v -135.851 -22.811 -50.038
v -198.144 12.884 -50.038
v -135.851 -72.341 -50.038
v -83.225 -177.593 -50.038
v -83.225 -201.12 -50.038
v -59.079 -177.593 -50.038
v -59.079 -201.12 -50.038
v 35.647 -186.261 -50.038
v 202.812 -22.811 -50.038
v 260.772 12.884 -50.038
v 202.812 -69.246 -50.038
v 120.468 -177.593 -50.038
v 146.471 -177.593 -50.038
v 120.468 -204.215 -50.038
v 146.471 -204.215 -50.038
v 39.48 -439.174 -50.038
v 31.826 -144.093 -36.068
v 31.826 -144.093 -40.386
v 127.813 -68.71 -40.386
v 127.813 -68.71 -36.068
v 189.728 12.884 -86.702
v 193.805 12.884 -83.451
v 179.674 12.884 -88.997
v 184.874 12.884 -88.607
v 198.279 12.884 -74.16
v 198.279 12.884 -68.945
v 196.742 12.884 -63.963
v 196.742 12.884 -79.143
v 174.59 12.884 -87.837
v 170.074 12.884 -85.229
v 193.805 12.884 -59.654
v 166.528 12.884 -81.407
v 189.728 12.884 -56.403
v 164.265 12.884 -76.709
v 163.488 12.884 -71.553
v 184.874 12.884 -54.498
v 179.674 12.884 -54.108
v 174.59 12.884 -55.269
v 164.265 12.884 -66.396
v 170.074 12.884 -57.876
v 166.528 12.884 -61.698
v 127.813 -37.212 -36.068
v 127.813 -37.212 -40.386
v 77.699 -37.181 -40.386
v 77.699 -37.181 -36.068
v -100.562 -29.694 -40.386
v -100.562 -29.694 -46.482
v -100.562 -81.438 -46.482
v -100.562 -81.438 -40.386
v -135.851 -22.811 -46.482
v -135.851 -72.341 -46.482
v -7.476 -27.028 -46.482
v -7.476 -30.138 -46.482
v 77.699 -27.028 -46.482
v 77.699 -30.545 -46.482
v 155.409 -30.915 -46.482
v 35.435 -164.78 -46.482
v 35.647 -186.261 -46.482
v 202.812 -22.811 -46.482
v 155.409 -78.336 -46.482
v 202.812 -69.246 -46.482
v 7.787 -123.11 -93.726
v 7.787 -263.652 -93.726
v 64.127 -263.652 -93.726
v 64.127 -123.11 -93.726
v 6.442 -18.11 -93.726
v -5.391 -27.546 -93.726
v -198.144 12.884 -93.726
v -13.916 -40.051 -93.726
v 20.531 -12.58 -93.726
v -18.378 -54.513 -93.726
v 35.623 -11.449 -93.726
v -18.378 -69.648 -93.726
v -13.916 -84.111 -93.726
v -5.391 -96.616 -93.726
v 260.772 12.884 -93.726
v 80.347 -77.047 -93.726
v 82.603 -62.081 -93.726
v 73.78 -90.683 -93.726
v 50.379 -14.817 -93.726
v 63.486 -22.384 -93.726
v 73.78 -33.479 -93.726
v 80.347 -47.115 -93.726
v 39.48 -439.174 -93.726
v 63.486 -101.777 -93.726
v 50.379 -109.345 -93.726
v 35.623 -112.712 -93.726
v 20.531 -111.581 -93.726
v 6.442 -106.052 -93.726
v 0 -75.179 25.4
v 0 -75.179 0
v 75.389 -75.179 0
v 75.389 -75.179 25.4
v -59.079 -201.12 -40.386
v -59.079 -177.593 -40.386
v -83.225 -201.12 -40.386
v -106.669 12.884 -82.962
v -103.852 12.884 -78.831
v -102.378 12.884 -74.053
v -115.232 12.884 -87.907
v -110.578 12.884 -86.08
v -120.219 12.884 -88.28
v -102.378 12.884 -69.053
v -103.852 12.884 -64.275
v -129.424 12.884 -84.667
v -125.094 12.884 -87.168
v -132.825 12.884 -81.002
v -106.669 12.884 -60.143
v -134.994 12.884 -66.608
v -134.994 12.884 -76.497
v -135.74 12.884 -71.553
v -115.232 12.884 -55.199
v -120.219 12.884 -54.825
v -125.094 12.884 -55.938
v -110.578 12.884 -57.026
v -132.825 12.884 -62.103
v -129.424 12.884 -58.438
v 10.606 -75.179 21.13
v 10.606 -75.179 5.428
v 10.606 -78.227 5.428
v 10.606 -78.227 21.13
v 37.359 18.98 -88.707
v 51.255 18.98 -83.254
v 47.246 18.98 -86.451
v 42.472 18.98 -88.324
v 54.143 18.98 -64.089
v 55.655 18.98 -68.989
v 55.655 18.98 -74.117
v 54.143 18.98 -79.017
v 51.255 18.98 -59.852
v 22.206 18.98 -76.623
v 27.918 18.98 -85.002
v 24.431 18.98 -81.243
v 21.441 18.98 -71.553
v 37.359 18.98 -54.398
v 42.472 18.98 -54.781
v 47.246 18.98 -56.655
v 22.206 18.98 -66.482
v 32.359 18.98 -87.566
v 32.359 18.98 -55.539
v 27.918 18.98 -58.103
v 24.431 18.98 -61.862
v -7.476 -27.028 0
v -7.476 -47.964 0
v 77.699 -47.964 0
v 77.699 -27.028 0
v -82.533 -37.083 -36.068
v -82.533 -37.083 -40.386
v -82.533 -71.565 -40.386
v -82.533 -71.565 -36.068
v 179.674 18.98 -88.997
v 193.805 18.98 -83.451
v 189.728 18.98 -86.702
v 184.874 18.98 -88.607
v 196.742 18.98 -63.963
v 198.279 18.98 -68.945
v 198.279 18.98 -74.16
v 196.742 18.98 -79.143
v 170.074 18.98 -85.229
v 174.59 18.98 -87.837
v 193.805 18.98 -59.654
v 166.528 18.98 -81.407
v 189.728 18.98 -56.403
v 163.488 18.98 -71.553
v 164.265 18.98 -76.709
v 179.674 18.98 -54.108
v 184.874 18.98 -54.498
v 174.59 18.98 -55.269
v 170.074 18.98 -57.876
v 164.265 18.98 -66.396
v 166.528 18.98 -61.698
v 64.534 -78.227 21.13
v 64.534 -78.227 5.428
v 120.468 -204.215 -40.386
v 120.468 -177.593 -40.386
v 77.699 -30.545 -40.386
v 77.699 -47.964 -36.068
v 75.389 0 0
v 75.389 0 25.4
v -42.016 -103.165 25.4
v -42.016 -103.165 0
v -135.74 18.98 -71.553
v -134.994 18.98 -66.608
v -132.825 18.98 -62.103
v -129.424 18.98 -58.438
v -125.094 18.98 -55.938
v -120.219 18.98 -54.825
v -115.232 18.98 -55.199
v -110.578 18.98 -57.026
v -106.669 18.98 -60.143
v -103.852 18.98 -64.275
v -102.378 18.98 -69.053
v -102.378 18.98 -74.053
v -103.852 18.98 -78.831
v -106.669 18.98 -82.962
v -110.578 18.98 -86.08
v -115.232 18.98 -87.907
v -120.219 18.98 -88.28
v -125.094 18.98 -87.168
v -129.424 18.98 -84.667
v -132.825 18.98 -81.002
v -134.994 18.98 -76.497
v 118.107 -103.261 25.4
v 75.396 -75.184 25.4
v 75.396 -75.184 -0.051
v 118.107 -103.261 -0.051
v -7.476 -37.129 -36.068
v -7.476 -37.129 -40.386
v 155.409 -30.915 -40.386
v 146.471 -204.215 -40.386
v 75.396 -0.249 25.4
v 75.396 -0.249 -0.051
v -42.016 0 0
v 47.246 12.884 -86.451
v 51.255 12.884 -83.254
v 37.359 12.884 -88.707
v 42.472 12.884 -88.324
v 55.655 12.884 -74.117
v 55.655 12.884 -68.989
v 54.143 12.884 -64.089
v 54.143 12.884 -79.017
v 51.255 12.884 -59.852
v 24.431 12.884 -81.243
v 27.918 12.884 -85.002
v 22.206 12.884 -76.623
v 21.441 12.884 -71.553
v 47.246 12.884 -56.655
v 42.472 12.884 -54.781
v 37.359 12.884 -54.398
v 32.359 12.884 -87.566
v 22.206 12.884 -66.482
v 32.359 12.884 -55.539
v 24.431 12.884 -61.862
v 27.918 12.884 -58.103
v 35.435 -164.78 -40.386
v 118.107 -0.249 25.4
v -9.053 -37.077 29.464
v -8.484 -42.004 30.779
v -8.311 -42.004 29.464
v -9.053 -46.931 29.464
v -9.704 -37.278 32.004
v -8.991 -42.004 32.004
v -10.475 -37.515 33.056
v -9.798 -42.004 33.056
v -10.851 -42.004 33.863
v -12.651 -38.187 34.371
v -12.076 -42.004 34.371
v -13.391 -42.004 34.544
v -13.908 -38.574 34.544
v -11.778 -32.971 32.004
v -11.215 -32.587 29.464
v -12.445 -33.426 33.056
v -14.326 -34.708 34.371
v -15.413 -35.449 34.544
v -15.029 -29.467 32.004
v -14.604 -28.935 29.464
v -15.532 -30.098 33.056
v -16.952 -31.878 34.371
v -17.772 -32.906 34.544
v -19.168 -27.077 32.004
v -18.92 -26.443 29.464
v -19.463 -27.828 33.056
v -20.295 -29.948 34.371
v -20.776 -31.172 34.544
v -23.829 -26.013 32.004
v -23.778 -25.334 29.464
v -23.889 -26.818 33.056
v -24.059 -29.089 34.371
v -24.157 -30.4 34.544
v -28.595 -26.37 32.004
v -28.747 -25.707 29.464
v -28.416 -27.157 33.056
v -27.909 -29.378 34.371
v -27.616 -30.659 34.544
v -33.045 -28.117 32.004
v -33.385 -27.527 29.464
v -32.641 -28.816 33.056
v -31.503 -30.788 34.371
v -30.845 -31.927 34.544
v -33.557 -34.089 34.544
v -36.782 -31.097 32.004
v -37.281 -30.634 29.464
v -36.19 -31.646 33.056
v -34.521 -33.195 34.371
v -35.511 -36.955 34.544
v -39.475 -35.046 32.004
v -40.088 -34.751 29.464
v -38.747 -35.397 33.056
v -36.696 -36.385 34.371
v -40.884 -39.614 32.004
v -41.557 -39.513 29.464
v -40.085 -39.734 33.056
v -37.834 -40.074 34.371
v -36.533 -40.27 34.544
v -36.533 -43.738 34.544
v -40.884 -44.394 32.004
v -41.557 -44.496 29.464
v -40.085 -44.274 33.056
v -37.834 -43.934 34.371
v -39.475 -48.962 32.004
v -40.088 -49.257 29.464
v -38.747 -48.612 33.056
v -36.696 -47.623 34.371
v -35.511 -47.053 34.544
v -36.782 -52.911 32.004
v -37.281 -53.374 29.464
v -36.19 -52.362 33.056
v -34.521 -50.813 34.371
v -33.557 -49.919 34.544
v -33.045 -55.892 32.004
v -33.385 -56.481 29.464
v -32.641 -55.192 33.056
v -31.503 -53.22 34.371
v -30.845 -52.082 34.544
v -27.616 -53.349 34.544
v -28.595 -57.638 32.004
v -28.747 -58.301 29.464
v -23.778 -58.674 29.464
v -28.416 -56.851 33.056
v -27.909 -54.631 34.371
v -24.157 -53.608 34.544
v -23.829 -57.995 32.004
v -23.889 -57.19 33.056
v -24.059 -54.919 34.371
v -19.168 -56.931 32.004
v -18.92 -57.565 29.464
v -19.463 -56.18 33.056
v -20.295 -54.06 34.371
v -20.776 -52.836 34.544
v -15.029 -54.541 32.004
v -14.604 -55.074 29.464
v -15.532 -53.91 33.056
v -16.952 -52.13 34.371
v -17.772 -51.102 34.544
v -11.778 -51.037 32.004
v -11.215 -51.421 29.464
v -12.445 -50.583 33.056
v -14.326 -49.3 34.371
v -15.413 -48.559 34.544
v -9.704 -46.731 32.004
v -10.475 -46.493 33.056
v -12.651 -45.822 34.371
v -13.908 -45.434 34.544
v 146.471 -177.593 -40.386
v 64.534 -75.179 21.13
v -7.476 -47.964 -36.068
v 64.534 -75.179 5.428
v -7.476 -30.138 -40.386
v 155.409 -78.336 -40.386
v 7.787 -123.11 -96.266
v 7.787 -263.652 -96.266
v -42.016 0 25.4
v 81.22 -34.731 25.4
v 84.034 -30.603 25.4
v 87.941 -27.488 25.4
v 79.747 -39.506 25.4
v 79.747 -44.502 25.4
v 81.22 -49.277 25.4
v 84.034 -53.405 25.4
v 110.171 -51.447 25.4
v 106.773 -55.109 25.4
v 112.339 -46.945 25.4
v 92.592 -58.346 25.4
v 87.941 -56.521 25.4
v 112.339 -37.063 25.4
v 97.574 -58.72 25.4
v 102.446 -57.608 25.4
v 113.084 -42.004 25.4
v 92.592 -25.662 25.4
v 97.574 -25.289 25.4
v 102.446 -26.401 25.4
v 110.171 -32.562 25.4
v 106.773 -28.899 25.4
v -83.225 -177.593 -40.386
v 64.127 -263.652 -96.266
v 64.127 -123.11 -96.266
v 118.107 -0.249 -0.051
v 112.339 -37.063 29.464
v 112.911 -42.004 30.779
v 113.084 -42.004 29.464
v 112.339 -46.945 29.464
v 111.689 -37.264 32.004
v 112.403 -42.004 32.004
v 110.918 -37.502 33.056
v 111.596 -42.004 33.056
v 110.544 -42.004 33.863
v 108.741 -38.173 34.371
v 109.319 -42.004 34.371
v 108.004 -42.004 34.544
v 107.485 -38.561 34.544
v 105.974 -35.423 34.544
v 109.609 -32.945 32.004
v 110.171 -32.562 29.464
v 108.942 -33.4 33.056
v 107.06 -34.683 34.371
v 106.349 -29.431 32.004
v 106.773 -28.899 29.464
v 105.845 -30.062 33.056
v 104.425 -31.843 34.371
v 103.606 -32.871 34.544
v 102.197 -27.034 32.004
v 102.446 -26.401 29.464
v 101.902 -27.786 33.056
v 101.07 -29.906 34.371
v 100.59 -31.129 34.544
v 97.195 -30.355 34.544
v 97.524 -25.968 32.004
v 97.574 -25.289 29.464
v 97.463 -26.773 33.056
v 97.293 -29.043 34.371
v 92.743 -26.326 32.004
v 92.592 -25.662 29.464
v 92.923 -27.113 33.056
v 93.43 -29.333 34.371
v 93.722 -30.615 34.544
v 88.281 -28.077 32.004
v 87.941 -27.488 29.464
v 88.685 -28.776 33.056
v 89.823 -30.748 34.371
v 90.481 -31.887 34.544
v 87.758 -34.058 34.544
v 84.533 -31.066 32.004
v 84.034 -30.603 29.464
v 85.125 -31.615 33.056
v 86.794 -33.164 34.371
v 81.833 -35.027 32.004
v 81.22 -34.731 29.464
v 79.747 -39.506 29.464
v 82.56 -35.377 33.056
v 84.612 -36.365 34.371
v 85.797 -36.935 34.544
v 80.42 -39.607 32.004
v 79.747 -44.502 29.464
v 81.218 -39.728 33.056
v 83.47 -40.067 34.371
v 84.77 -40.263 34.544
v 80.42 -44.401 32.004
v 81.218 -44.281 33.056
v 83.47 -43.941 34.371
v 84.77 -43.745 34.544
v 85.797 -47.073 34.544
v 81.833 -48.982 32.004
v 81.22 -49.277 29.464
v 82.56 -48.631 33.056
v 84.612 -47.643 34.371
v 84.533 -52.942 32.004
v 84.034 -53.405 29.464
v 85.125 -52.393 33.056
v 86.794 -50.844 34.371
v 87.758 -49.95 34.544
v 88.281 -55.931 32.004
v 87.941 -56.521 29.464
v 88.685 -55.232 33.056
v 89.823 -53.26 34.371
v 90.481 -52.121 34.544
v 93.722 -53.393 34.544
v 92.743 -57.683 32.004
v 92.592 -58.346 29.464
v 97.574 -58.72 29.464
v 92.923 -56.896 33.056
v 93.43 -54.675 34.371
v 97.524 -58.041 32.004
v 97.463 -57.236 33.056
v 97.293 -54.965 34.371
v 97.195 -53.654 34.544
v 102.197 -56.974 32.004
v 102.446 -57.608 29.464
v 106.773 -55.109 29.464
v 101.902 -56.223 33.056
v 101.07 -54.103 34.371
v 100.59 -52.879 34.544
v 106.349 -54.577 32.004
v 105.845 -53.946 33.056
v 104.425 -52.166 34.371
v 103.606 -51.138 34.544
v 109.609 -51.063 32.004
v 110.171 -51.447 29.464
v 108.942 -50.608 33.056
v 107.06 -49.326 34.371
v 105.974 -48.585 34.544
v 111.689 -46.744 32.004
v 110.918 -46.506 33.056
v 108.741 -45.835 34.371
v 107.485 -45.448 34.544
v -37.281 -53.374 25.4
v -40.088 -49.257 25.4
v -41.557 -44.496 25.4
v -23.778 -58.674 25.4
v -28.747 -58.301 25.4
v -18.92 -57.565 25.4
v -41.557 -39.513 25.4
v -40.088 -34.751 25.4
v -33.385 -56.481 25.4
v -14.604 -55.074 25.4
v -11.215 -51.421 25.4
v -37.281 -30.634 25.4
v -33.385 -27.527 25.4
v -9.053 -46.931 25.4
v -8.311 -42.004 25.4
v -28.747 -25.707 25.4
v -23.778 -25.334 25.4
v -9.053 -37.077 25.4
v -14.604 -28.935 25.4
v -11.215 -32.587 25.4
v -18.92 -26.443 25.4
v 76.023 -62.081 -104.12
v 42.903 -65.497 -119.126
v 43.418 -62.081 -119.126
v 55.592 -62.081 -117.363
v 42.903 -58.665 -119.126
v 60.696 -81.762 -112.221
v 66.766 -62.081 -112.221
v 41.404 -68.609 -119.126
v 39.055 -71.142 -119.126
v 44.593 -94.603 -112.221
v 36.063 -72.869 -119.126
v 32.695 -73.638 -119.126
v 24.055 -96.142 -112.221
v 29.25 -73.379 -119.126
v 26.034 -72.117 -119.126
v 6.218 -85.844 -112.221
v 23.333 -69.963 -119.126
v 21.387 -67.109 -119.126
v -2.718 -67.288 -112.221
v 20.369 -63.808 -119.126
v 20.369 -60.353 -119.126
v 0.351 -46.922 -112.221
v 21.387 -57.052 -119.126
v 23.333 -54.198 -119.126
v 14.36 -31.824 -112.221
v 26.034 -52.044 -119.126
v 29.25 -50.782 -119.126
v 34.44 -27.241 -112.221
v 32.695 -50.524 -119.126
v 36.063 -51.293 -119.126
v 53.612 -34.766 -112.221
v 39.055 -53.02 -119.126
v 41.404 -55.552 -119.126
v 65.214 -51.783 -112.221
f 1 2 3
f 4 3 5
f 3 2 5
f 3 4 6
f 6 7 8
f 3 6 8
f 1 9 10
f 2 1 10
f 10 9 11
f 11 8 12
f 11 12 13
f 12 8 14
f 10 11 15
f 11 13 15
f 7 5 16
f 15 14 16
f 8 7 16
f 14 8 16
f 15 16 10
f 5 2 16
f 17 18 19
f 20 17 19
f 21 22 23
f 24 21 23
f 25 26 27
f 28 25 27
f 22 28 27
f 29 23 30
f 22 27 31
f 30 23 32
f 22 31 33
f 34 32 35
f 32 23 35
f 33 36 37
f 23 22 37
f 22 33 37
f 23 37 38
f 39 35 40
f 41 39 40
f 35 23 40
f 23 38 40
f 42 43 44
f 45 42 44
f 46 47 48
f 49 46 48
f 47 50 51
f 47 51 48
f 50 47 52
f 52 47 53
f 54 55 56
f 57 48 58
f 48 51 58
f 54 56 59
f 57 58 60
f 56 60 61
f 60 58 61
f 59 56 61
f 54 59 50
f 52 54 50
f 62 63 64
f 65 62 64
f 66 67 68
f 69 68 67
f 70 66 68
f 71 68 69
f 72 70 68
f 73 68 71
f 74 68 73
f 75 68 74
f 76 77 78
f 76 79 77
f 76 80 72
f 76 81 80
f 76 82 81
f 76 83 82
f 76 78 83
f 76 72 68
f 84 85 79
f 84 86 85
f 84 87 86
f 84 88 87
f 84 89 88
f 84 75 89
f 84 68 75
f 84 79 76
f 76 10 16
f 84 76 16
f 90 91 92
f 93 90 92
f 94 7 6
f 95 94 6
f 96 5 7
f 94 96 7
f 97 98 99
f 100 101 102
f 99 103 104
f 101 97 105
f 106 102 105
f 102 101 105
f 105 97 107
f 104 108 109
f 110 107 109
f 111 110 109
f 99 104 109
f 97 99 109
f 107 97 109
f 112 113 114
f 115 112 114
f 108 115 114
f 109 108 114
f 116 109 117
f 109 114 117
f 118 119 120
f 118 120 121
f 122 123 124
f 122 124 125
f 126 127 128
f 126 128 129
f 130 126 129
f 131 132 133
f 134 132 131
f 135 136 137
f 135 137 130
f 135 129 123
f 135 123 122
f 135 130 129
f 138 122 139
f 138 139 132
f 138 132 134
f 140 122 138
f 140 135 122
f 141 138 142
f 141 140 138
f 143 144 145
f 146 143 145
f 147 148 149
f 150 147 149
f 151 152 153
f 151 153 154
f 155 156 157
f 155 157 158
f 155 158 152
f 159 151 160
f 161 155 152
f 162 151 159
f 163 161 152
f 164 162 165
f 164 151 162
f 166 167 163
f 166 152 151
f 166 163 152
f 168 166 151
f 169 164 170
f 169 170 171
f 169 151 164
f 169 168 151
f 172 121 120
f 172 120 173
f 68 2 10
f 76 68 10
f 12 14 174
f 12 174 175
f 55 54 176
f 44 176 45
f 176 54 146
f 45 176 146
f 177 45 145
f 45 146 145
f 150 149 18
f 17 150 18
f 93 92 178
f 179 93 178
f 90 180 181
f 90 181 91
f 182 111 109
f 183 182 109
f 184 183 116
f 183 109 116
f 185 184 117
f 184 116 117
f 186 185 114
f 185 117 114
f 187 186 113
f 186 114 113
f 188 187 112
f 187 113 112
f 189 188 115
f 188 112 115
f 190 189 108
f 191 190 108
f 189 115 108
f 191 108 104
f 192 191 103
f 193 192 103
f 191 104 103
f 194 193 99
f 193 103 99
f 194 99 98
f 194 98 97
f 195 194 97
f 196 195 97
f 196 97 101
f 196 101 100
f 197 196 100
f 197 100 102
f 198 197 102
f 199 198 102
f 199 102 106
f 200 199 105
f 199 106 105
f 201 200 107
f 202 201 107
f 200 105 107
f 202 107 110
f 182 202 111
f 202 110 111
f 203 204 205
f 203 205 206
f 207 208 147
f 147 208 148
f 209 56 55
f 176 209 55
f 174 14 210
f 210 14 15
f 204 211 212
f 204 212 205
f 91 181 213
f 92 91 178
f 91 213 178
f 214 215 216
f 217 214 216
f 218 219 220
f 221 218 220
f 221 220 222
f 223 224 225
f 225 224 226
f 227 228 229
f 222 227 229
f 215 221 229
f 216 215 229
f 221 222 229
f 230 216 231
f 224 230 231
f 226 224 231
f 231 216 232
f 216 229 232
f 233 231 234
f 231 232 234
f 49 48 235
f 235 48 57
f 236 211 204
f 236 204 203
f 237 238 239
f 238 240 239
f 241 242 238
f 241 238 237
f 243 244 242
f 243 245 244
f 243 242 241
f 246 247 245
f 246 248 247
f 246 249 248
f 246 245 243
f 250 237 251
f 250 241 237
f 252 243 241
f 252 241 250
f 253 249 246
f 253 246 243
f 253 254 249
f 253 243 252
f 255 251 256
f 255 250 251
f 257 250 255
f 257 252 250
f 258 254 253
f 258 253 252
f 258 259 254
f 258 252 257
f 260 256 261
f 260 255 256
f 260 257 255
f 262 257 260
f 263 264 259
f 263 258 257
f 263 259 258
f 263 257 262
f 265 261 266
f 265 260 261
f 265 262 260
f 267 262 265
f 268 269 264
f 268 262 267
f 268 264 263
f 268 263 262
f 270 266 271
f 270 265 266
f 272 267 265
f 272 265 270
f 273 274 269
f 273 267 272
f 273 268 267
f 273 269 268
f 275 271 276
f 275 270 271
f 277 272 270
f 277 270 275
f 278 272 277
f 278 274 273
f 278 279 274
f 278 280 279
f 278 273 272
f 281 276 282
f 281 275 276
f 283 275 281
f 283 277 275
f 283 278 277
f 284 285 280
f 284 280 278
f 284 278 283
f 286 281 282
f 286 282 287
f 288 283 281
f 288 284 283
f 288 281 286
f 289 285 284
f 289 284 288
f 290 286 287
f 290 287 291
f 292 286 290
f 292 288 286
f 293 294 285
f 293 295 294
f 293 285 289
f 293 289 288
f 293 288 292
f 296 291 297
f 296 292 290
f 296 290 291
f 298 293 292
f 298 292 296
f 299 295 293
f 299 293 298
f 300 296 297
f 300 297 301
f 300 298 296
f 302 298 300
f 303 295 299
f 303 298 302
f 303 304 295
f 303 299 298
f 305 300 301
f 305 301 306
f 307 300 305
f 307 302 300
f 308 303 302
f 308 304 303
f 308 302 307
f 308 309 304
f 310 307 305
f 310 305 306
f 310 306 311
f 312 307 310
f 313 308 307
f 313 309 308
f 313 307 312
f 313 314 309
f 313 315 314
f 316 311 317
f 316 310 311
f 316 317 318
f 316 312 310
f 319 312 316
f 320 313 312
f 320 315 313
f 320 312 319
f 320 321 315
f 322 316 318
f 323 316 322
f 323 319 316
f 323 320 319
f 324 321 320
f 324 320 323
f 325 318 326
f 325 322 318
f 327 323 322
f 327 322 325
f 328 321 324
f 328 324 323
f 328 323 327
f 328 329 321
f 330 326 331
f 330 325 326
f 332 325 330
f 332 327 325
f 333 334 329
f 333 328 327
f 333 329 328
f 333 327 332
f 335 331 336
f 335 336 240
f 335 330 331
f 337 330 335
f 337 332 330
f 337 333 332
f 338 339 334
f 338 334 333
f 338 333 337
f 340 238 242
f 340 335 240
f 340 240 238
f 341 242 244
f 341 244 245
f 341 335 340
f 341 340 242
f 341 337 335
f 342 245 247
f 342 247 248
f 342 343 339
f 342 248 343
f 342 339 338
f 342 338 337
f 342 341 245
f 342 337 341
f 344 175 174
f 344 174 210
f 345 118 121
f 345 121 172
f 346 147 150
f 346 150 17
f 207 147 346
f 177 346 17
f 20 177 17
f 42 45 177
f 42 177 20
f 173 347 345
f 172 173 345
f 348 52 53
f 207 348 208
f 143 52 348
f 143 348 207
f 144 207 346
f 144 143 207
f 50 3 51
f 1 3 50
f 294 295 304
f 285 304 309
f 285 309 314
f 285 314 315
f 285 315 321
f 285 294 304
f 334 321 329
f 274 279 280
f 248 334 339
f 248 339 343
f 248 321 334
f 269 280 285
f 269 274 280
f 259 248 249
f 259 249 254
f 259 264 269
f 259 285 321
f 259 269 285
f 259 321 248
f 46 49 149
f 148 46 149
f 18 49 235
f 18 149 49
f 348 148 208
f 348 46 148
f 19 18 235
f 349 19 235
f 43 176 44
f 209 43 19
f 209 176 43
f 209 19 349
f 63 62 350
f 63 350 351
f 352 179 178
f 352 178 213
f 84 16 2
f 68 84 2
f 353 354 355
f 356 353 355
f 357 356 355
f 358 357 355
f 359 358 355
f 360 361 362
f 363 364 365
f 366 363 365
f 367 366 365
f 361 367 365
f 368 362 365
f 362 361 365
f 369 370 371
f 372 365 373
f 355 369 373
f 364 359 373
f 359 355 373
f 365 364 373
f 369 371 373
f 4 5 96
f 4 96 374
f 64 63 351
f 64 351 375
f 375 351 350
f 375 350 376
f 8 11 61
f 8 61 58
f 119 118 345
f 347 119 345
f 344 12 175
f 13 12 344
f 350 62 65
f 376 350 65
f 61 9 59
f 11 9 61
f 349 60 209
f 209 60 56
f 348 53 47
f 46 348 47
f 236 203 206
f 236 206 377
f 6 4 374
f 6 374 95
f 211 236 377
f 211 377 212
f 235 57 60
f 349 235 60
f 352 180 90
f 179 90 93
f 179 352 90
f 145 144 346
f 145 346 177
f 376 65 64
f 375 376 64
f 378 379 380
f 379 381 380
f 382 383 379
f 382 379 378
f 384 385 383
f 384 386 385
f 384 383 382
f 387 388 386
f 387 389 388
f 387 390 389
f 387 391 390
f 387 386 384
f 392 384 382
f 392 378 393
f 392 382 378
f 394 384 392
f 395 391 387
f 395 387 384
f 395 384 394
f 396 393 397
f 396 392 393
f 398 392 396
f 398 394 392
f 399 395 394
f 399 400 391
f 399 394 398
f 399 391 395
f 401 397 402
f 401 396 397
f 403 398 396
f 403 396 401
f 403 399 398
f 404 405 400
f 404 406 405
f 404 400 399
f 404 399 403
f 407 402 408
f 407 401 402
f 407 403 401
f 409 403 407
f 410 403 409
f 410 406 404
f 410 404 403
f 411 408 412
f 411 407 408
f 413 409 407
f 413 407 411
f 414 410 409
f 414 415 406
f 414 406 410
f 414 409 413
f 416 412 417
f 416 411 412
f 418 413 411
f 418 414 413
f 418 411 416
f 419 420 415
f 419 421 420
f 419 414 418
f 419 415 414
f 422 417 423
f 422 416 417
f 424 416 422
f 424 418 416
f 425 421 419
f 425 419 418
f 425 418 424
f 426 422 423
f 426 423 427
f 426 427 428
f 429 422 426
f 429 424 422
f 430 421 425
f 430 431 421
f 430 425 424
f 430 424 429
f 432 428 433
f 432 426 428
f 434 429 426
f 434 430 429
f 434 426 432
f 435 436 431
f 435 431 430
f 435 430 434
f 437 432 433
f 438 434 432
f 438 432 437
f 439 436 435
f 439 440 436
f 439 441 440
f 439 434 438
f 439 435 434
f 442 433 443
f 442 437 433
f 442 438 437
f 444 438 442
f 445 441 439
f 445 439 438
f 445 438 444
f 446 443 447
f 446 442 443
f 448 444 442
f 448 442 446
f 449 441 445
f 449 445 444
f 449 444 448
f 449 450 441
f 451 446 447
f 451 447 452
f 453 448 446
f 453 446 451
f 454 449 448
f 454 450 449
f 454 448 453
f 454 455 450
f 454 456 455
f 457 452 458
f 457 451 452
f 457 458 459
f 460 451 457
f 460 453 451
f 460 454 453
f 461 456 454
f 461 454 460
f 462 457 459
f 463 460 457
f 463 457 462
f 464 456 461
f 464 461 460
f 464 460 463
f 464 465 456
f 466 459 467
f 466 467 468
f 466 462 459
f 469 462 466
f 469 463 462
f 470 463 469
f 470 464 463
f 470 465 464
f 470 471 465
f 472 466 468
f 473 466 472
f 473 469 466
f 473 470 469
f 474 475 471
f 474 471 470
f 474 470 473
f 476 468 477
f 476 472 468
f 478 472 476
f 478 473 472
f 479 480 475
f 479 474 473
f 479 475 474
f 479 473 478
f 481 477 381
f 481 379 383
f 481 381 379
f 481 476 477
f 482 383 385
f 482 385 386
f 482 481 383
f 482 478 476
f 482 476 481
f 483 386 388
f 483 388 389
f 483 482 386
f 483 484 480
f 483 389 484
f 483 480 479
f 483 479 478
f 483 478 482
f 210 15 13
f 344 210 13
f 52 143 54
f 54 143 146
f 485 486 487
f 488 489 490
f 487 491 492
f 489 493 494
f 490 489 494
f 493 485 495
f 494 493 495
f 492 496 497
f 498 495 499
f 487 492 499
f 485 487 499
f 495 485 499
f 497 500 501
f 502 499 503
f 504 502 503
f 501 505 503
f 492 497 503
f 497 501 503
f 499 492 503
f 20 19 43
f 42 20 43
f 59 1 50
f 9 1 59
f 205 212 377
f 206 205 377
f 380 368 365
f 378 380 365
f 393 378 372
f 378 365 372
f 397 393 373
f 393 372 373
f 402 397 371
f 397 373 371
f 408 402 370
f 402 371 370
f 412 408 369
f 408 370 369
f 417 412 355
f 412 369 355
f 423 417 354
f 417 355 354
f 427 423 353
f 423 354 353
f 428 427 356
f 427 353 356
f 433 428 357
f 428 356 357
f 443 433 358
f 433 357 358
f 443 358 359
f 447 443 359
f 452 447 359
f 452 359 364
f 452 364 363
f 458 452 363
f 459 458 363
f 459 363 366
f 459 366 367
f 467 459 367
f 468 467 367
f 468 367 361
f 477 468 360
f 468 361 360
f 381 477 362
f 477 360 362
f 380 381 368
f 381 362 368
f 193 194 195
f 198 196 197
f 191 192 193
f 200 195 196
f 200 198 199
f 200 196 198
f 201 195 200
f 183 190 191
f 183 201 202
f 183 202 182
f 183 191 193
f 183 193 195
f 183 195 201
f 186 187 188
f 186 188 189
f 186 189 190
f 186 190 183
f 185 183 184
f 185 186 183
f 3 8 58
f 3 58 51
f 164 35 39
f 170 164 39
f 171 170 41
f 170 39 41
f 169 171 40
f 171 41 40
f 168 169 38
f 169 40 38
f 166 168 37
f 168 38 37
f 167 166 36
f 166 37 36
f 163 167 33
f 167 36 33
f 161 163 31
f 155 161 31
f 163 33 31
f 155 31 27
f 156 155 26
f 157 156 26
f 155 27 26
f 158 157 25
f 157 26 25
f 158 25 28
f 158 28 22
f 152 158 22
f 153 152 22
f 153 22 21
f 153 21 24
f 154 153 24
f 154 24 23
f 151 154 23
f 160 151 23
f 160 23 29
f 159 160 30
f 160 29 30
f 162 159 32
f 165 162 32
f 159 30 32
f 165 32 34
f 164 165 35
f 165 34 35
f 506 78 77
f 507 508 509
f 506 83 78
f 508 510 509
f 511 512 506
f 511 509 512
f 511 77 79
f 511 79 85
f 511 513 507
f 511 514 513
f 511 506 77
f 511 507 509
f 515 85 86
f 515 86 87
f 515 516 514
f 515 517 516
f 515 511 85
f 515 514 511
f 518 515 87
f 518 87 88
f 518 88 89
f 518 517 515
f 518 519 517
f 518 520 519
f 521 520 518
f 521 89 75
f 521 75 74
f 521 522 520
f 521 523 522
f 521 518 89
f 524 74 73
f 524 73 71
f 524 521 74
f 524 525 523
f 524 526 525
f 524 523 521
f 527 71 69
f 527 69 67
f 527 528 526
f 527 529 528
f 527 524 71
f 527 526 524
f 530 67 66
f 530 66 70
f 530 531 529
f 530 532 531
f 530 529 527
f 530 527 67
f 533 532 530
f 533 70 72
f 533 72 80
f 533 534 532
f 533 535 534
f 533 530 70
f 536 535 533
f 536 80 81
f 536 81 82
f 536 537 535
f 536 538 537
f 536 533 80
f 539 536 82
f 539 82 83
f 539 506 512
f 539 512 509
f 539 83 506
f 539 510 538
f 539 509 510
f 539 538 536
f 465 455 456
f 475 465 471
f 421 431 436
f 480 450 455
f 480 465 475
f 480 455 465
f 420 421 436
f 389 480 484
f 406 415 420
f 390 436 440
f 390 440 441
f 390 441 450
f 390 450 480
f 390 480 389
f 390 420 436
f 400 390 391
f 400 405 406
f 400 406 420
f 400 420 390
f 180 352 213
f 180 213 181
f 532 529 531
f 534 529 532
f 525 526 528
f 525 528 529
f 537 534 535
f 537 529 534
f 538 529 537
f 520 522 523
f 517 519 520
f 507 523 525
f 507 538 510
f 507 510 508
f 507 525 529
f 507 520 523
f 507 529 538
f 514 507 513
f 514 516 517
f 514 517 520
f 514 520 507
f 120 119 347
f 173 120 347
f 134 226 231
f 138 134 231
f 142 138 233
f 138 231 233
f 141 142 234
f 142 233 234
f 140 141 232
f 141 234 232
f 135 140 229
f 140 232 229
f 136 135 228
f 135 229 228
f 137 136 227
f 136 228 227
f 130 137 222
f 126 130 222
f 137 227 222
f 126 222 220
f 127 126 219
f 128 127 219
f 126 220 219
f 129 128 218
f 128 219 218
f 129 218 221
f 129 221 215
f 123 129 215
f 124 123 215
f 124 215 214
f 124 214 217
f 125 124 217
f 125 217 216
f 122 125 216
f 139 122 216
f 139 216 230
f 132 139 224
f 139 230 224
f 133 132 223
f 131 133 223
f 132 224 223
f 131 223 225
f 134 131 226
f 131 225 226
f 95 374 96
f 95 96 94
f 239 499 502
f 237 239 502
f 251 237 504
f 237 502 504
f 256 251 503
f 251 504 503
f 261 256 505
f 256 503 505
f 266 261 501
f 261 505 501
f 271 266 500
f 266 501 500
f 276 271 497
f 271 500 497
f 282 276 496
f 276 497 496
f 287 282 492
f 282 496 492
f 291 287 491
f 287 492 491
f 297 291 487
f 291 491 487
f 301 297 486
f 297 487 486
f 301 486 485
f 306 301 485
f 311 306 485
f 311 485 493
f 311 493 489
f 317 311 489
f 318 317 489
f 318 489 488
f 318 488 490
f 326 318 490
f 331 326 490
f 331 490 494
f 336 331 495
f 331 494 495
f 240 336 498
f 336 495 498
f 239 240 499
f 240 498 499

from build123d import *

# Parameters (mm, degrees)
F0_W      = 75.3890946507
F0_H      = 75.1791000366
F1_DEPTH  = 25.4
F4_DEPTH  = 25.4
F5_DEPTH  = 25.4508
F6_W      = 53.92798502
F6_H      = 15.7025610097
F7_DEPTH  = 3.048
F8_W      = 85.17449582
F8_H      = 20.9367480129
F9_DEPTH  = 50.038
F11_DEPTH = 43.688
F12_R     = 17.2027842211
F13_DEPTH = 6.096
F12_R_2   = 17.4931921262
F12_R_3   = 16.7744326075
F15_DEPTH = 3.556
F17_DEPTH = 6.096
F18_W     = 24.1459421813
F18_H     = 23.5268175602
F18_W_2   = 26.0033160448
F18_H_2   = 26.6224443913
F19_DEPTH = 9.652
F20_W     = 56.3405365683
F20_H     = 140.5417844653
F21_DEPTH = 2.54
F23_DEPTH = 4.318
F24_R     = 16.7164206505
F25_DEPTH = 9.144
F24_R_2   = 16.7622193937
F26_R     = 5.08
F26_2_R   = 5.08
F27_R     = 50.773582489
F28_DEPTH = 25.4


# Not quite as in the source:
# - a fillet or chamfer that OpenCascade refuses, or shapes differently, is made with other operations: its cross-section is extruded or revolved along the edge and cut away or added


with BuildPart() as f1:
    # F0 (on Top) → F1 (new body)
    with BuildSketch(Plane.XY):
        with Locations((37.6945473254, -37.5895500183)):
            Rectangle(F0_W, F0_H)
    extrude(amount=F1_DEPTH)

    # F2 (on face) → F4 (join)
    with BuildSketch(Plane.XY.offset(25.4)):
        Polygon((0, -75.1791000366), (0, 0), (-42.0155413449, 0), (-42.0155413449, -103.1650602818), align=None)
    extrude(amount=-F4_DEPTH)


with BuildPart() as f5:
    # F3 (on face) → F5 (new body)
    with BuildSketch(Plane.XY.offset(25.4)):
        Polygon((118.1067675352, -0.2493217471), (75.7626965642, -0.2493217471), (75.3957405686, -0.2493217471), (75.3957405686, -75.1837566495), (118.1067675352, -103.2613441348), align=None)
    extrude(amount=-F5_DEPTH)


with BuildPart() as f7:
    # F6 (on face) → F7 (new body)
    with BuildSketch(Plane.XZ.offset(75.1791000366)):
        with Locations((37.5697775744, 13.2790950593)):
            Rectangle(F6_W, F6_H)
    extrude(amount=F7_DEPTH)


with BuildPart() as f9:
    # F8 (on face) → F9 (new body)
    with BuildSketch(Plane(origin=(0, 0, 0), x_dir=(1, 0, 0), z_dir=(0, 0, -1))):
        with Locations((35.1112957578, 37.4959344044)):
            Rectangle(F8_W, F8_H)
    extrude(amount=F9_DEPTH)

    # F10 (on face) → F11 (join)
    with BuildSketch(Plane(origin=(0, 0, -50.038), x_dir=(1, 0, 0), z_dir=(0, 0, -1))):
        Polygon((260.7715725899, -12.8838187084), (39.4802503288, 439.1739666462), (-198.1444954872, -12.8838187084), align=None)
    extrude(amount=F11_DEPTH)

    # F14 (on face) → F15 (join)
    with BuildSketch(Plane(origin=(0, 0, -50.038), x_dir=(1, 0, 0), z_dir=(0, 0, -1))):
        Polygon((-135.8506828547, 72.3413750529), (-135.8506828547, 31.4790122211), (-135.8506828547, 22.8112302721), (202.8116434813, 22.8112302721), (202.8116434813, 69.2457407713), (35.6474258006, 186.2607002258), align=None)
    extrude(amount=-F15_DEPTH)

    # F16 (on face) → F17 (join)
    with BuildSketch(Plane.XY.offset(-46.482)):
        Polygon((-7.4759521522, -30.1380986139), (-100.561901927, -29.6938885003), (-100.561901927, -81.4376845956), (35.4353301227, -164.7797524929), (155.4093956947, -78.3358365297), (155.4093956947, -30.9153944254), (77.6985436678, -30.5445549325), (77.6985436678, -47.9643084109), (-7.4759521522, -47.9643084109), align=None)
    extrude(amount=F17_DEPTH)

    # F18 (on face) → F19 (join)
    with BuildSketch(Plane.XY.offset(-50.038)):
        with Locations((-71.1519364268, -189.3563270569)):
            Rectangle(F18_W, F18_H)
        with Locations((133.4694549441, -190.9041404724)):
            Rectangle(F18_W_2, F18_H_2)
    extrude(amount=F19_DEPTH)

    # F22 (on face) → F23 (join)
    with BuildSketch(Plane.XY.offset(-40.386)):
        Polygon((127.8130114079, -37.2119806707), (-82.5328603387, -37.0825752616), (-82.5328603387, -71.5653449297), (31.8256095052, -144.0929919481), (127.8130114079, -68.7100365758), align=None)
    extrude(amount=F23_DEPTH)

    # F27 (on face) → F28 (join)
    with BuildSketch(Plane(origin=(0, 0, -93.726), x_dir=(1, 0, 0), z_dir=(0, 0, -1))):
        with Locations((31.8289473653, 62.0807632804)):
            Circle(F27_R)
    extrude(amount=F28_DEPTH)

    # F29: fillet of radius 42.924717139 on 1 edges, made by hand

    # F29_s1 → F29_t2 (revolve, cut)
    with BuildSketch(Plane.XZ.offset(62.0807632804)):
        with BuildLine():
            ThreePointArc((82.6025298543, -93.726), (66.7664669422, -112.2205476203), (43.4181499222, -119.126))
            Line((43.4181499222, -119.126), (82.6025298543, -119.126))
            Line((82.6025298543, -119.126), (82.6025298543, -93.726))
        make_face()
    revolve(axis=Axis((31.8289473653, -62.0807632804, -119.126), (0, 0, -1)), mode=Mode.SUBTRACT)


with BuildPart() as f13:
    # F12 (on face) → F13 (new body)
    with BuildSketch(Plane(origin=(0, 12.8838187084, 0), x_dir=(-1, 0, 0), z_dir=(0, 1, 0))):
        with Locations((-38.6442020535, -71.5526640415)):
            Circle(F12_R)
    extrude(amount=F13_DEPTH)


with BuildPart() as f13b:
    # F12 (on face) → F13, piece 2 (new body)
    with BuildSketch(Plane(origin=(0, 12.8838187084, 0), x_dir=(-1, 0, 0), z_dir=(0, 1, 0))):
        with Locations((-180.981323123, -71.5526640415)):
            Circle(F12_R_2)
    extrude(amount=F13_DEPTH)


with BuildPart() as f13c:
    # F12 (on face) → F13, piece 3 (new body)
    with BuildSketch(Plane(origin=(0, 12.8838187084, 0), x_dir=(-1, 0, 0), z_dir=(0, 1, 0))):
        with Locations((118.9651414752, -71.5526640415)):
            Circle(F12_R_3)
    extrude(amount=F13_DEPTH)


with BuildPart() as f21:
    # F20 (on face) → F21 (new body)
    with BuildSketch(Plane(origin=(0, 0, -93.726), x_dir=(1, 0, 0), z_dir=(0, 0, -1))):
        with Locations((35.9569906723, 193.3806575835)):
            Rectangle(F20_W, F20_H)
    extrude(amount=F21_DEPTH)


with BuildPart() as f25:
    # F24 (on face) → F25 (new body)
    with BuildSketch(Plane.XY.offset(25.4)):
        with Locations((-25.0269956887, -42.0041643083)):
            Circle(F24_R)
    extrude(amount=F25_DEPTH)

    # F26
    f26_edges = [f25.edges().sort_by_distance(p)[0] for p in [
        (-41.743416, -42.004164, 34.544),
    ]]
    fillet(f26_edges, radius=F26_R)


with BuildPart() as f25b:
    # F24 (on face) → F25, piece 2 (new body)
    with BuildSketch(Plane.XY.offset(25.4)):
        with Locations((96.3218435645, -42.0041643083)):
            Circle(F24_R_2)
    extrude(amount=F25_DEPTH)

    # F26#2
    f26_2_edges = [f25b.edges().sort_by_distance(p)[0] for p in [
        (79.559624, -42.004164, 34.544),
    ]]
    fillet(f26_2_edges, radius=F26_2_R)


solid = Compound([f1.part, f5.part, f7.part, f9.part, f13.part, f13b.part, f13c.part, f21.part, f25.part, f25b.part])
